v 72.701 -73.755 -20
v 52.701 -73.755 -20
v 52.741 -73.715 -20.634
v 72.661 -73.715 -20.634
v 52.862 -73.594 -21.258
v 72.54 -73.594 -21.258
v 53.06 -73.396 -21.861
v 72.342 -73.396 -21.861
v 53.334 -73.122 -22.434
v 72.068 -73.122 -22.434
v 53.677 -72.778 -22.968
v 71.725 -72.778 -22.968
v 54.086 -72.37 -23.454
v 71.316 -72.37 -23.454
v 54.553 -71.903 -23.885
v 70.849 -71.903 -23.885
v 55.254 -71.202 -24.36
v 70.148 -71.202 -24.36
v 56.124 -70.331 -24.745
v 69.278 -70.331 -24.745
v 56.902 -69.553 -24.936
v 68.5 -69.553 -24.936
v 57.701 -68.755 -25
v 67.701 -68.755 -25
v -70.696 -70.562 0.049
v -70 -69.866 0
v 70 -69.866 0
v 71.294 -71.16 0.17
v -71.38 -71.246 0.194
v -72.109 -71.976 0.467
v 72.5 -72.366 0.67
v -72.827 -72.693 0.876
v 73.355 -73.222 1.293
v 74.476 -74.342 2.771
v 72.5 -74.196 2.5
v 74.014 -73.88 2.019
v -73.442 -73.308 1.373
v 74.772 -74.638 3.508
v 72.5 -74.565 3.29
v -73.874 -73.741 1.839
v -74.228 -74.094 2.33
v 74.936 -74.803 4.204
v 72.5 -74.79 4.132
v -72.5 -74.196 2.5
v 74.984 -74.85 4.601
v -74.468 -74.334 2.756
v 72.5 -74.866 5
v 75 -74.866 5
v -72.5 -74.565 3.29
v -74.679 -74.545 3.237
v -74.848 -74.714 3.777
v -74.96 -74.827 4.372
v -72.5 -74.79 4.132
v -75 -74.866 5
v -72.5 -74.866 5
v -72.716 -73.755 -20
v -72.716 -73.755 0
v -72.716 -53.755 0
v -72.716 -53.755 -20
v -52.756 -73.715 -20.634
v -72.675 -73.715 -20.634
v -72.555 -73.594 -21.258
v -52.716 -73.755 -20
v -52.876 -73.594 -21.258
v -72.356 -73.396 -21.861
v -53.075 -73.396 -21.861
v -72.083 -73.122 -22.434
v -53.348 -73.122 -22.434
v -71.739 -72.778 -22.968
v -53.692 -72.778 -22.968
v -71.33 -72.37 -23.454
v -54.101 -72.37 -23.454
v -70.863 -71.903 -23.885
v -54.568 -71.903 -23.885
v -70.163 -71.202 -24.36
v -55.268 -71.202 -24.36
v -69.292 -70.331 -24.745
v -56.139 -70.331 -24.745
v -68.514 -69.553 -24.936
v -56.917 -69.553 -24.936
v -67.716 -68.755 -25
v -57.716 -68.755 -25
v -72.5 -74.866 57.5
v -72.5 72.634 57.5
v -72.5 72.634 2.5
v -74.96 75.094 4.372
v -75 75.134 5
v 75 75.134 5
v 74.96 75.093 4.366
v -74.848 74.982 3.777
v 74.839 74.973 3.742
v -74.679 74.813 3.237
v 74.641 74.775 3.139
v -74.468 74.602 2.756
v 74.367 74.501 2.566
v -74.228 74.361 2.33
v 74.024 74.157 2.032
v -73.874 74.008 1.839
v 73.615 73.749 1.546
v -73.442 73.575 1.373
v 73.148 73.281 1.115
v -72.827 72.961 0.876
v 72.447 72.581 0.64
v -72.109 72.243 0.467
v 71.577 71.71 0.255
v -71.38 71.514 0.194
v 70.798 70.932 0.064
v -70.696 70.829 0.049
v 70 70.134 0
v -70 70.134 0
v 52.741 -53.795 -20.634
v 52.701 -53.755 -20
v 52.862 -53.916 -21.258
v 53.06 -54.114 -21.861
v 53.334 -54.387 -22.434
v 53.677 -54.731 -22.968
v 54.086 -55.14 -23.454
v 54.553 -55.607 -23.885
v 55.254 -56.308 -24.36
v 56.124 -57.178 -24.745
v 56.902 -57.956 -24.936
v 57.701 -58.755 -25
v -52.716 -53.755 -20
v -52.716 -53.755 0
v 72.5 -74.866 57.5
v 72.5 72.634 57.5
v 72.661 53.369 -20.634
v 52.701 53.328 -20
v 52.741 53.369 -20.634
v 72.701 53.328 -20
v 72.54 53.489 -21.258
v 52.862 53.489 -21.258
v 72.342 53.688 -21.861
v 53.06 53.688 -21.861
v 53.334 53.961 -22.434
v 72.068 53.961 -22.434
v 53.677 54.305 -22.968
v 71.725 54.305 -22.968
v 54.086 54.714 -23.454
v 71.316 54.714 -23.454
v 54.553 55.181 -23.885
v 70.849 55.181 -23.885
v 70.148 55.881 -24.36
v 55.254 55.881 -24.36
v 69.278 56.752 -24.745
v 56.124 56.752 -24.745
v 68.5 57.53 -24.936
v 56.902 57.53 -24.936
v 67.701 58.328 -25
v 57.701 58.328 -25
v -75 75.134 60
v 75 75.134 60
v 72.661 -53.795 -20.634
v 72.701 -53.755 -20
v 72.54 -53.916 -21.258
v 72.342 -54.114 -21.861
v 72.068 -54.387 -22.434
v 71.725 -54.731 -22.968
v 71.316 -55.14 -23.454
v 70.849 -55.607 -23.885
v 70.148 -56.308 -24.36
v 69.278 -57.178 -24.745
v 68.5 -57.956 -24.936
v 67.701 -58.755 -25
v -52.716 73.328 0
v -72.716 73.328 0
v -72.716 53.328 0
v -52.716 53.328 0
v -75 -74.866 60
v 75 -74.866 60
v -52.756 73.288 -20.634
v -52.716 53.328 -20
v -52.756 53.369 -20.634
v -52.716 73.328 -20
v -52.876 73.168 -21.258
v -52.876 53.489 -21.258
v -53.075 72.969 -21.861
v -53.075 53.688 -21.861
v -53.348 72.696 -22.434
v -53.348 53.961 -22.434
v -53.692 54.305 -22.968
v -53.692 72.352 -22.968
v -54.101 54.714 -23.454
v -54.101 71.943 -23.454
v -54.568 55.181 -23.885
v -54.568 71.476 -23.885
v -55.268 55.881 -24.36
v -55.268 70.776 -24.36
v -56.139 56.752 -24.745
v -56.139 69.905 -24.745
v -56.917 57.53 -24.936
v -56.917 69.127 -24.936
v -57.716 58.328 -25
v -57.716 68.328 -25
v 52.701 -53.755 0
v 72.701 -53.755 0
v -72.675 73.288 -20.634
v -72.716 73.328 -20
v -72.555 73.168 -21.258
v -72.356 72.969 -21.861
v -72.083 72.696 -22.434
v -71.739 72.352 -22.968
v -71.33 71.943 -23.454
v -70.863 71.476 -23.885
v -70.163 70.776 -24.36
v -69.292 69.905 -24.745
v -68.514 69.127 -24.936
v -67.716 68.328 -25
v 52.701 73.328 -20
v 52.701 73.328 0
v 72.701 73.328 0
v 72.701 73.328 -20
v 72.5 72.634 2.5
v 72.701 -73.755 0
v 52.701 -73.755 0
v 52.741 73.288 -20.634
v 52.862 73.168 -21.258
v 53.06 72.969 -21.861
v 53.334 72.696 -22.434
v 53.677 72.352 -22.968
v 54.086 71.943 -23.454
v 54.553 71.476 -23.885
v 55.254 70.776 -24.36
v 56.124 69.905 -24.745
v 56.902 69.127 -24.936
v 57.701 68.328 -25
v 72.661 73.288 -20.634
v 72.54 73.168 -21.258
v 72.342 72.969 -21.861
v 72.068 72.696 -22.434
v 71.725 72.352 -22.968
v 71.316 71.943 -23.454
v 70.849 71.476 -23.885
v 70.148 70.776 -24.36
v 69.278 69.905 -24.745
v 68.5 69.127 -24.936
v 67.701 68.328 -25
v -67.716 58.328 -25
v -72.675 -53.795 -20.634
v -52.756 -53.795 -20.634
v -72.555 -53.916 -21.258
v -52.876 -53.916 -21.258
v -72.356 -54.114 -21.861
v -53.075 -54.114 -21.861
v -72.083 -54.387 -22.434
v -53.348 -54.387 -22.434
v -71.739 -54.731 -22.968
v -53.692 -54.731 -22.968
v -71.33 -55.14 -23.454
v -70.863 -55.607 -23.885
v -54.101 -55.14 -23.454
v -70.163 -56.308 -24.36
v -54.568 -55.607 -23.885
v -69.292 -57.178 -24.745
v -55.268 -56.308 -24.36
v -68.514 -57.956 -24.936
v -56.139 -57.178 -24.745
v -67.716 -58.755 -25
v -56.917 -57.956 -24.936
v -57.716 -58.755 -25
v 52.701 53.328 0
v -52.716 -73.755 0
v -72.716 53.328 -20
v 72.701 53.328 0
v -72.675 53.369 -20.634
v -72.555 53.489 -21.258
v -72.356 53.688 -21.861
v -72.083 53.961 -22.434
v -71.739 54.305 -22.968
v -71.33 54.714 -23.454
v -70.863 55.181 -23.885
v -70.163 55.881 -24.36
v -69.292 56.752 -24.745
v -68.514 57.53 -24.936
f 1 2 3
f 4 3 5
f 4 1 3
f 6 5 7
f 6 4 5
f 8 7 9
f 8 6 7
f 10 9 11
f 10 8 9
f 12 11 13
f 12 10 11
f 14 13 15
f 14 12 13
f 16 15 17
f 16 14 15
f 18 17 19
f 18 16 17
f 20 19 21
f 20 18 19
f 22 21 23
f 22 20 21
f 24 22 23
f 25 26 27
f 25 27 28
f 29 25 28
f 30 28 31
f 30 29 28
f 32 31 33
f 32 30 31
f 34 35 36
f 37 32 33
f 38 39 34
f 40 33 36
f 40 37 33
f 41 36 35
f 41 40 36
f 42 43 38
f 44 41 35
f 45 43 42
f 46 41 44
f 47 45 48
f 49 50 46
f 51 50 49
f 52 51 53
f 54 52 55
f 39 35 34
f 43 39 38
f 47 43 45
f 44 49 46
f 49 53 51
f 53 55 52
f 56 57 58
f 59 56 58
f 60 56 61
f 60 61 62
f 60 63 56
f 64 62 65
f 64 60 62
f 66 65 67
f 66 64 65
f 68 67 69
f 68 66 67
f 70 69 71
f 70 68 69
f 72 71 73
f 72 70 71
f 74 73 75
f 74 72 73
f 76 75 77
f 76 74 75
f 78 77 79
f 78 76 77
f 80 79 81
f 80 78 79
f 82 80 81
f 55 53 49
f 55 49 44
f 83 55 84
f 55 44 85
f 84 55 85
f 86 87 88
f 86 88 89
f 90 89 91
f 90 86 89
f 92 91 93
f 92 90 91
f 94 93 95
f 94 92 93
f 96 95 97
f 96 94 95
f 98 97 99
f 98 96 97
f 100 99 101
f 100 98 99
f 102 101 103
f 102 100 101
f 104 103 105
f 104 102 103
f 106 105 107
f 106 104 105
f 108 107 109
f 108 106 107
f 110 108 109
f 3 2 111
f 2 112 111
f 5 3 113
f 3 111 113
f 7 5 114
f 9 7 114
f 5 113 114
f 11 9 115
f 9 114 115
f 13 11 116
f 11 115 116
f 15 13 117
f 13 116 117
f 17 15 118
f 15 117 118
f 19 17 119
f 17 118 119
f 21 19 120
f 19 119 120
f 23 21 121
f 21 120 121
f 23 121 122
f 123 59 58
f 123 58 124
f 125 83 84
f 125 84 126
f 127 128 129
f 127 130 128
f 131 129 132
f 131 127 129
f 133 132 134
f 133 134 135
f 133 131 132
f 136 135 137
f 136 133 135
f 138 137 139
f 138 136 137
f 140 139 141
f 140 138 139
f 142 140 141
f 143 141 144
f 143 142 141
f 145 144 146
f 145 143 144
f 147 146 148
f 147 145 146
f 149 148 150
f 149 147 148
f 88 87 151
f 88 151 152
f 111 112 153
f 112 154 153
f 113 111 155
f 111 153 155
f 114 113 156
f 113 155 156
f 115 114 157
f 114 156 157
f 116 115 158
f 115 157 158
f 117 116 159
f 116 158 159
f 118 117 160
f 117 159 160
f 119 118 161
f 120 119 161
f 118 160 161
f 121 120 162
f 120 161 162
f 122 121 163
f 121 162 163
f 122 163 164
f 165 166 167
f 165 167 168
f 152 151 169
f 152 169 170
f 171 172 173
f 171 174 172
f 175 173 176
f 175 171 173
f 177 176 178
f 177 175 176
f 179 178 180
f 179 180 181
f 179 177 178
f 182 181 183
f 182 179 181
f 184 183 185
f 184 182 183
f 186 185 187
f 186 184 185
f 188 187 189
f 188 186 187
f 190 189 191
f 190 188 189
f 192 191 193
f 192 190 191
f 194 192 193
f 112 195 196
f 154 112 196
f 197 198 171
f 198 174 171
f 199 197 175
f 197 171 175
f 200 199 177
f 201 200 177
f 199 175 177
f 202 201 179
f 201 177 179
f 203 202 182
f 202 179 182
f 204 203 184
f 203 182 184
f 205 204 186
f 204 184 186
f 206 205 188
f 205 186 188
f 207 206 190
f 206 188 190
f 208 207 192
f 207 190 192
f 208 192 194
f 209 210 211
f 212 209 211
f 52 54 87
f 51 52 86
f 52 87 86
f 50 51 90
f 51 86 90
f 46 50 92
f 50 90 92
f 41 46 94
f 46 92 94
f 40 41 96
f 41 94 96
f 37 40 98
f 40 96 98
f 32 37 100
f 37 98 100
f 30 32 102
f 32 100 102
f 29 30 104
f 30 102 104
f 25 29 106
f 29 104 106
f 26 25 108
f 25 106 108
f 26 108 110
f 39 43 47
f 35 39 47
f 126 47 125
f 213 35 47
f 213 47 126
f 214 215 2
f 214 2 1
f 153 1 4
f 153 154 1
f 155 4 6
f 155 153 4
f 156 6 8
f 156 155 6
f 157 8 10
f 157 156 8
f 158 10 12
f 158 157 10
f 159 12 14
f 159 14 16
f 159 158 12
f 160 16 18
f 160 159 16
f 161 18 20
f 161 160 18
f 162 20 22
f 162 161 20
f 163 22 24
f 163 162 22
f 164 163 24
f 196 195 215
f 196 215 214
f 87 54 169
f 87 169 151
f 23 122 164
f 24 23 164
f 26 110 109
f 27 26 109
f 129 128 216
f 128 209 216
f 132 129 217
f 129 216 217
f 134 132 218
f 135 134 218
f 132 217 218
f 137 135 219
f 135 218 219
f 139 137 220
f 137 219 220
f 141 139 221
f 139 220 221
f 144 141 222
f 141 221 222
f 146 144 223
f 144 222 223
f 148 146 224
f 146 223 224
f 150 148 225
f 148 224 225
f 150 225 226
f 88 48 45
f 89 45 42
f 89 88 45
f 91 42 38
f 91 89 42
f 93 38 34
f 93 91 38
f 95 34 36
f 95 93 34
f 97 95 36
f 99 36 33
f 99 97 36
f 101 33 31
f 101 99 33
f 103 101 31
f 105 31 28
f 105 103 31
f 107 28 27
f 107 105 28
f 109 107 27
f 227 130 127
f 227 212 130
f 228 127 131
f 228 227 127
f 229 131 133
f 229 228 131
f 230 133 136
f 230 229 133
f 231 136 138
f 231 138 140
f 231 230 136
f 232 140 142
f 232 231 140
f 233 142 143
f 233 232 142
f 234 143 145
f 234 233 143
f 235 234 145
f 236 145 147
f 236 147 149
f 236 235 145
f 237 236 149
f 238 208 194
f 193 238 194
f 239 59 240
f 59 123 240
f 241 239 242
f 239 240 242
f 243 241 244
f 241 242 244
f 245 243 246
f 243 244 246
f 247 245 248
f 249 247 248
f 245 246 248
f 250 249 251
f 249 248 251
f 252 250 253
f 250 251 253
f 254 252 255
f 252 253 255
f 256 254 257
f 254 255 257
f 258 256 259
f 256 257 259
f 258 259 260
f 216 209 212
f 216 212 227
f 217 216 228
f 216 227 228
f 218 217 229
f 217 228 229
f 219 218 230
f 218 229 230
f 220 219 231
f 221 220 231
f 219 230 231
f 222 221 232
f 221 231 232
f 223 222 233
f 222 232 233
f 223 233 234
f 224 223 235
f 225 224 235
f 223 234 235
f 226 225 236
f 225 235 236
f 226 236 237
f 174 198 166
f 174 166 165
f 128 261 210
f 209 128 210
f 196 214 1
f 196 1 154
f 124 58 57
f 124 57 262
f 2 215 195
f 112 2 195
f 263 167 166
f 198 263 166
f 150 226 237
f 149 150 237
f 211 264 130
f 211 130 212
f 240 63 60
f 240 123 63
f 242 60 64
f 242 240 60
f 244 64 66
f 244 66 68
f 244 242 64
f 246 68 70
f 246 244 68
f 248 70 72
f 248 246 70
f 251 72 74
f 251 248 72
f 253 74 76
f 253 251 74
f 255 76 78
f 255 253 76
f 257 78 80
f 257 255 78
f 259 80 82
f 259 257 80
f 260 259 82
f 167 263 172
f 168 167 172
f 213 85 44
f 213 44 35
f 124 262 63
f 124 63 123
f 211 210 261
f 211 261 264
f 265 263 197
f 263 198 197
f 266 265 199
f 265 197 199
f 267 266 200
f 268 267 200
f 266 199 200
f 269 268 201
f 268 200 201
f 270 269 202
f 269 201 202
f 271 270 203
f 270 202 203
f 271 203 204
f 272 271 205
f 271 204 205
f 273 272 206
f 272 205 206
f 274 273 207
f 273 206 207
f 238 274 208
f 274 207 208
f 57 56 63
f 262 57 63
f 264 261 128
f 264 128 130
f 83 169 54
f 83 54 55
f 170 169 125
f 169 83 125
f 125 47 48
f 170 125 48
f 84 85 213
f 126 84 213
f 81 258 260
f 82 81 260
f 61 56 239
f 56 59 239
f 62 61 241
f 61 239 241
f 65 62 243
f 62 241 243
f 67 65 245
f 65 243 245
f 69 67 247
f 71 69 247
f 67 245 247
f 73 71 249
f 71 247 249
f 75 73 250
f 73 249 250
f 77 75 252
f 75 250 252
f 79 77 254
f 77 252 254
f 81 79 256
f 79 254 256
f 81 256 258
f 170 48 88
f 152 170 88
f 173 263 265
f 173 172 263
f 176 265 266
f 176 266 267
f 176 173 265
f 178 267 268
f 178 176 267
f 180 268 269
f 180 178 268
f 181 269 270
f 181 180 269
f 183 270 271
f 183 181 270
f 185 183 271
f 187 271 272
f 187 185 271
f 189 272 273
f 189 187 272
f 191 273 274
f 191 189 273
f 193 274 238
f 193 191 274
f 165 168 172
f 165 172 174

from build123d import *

# Parameters (mm, degrees)
F0_W        = 20
F0_H        = 20
F1_DEPTH    = 25
F2_W        = 150
F2_H        = 150
F3_DEPTH    = 60
F4_T        = -2.5
F5_R        = 5
F5_2_R      = 5
F5_3_R      = 5
F5_4_R      = 5
F6_T1_DEPTH = 175
F6_T3_DEPTH = 175


# Not quite as in the source:
# - a fillet or chamfer that OpenCascade refuses, or shapes differently, is made with other operations: its cross-section is extruded or revolved along the edge and cut away or added


with BuildPart() as f1:
    # F0 (on Top) → F1 (new body)
    with BuildSketch(Plane.XY):
        with Locations((-62.7156771406, 63.3284281388)):
            Rectangle(F0_W, F0_H)
    extrude(amount=-F1_DEPTH)

    # F5#4
    f5_4_edges = [f1.edges().sort_by_distance(p)[0] for p in [
        (-62.715677, 73.328428, -25),
        (-72.715677, 63.328428, -25),
        (-62.715677, 53.328428, -25),
        (-52.715677, 63.328428, -25),
    ]]
    fillet(f5_4_edges, radius=F5_4_R)


with BuildPart() as f1b:
    # F0 (on Top) → F1, piece 2 (new body)
    with BuildSketch(Plane.XY):
        with Locations((-62.7156771406, -63.7548786509)):
            Rectangle(F0_W, F0_H)
    extrude(amount=-F1_DEPTH)

    # F5
    f5_edges = [f1b.edges().sort_by_distance(p)[0] for p in [
        (-62.715677, -53.754879, -25),
        (-72.715677, -63.754879, -25),
        (-62.715677, -73.754879, -25),
        (-52.715677, -63.754879, -25),
    ]]
    fillet(f5_edges, radius=F5_R)


with BuildPart() as f1c:
    # F0 (on Top) → F1, piece 3 (new body)
    with BuildSketch(Plane.XY):
        with Locations((62.7009654807, 63.3284281388)):
            Rectangle(F0_W, F0_H)
    extrude(amount=-F1_DEPTH)

    # F5#3
    f5_3_edges = [f1c.edges().sort_by_distance(p)[0] for p in [
        (52.700965, 63.328428, -25),
        (62.700965, 53.328428, -25),
        (72.700965, 63.328428, -25),
        (62.700965, 73.328428, -25),
    ]]
    fillet(f5_3_edges, radius=F5_3_R)


with BuildPart() as f1d:
    # F0 (on Top) → F1, piece 4 (new body)
    with BuildSketch(Plane.XY):
        with Locations((62.7009654807, -63.7548786509)):
            Rectangle(F0_W, F0_H)
    extrude(amount=-F1_DEPTH)

    # F5#2
    f5_2_edges = [f1d.edges().sort_by_distance(p)[0] for p in [
        (52.700965, -63.754879, -25),
        (62.700965, -73.754879, -25),
        (72.700965, -63.754879, -25),
        (62.700965, -53.754879, -25),
    ]]
    fillet(f5_2_edges, radius=F5_2_R)


with BuildPart() as f3:
    # F2 (on Top) → F3 (new body)
    with BuildSketch(Plane.XY):
        with Locations((-3.77863e-05, 0.1337043941)):
            Rectangle(F2_W, F2_H)
    extrude(amount=F3_DEPTH)

    # F4
    f4_openings = [f3.faces().sort_by_distance(p)[0] for p in [
        (-3.8e-05, -74.866296, 30),
    ]]
    offset(amount=F4_T, openings=f4_openings)

    # F6: fillet of radius 5 on 4 edges, made by hand

    # F6_s2 → F6_t1 (cut)
    with BuildSketch(Plane.YZ.offset(-87.5000377863)):
        with BuildLine():
            ThreePointArc((75.1337043941, 5), (73.6692383, 1.4644660941), (70.1337043941, 0))
            Line((70.1337043941, 0), (75.1337043941, 0))
            Line((75.1337043941, 0), (75.1337043941, 5))
        make_face()
        with BuildLine():
            ThreePointArc((-69.8662956059, 0), (-73.4018295118, 1.4644660941), (-74.8662956059, 5))
            Line((-74.8662956059, 5), (-74.8662956059, 0))
            Line((-74.8662956059, 0), (-69.8662956059, 0))
        make_face()
    extrude(amount=F6_T1_DEPTH, mode=Mode.SUBTRACT)

    # F6_s4 → F6_t3 (cut)
    with BuildSketch(Plane.XZ.offset(-87.6337043941)):
        with BuildLine():
            ThreePointArc((-75.0000377863, 5), (-73.5355716923, 1.4644660941), (-70.0000377863, 0))
            Line((-70.0000377863, 0), (-75.0000377863, 0))
            Line((-75.0000377863, 0), (-75.0000377863, 5))
        make_face()
        with BuildLine():
            ThreePointArc((74.9999622137, 5), (73.5354961196, 1.4644660941), (69.9999622137, 0))
            Line((69.9999622137, 0), (74.9999622137, 0))
            Line((74.9999622137, 0), (74.9999622137, 5))
        make_face()
    extrude(amount=F6_T3_DEPTH, mode=Mode.SUBTRACT)


solid = Compound([f1.part, f1b.part, f1c.part, f1d.part, f3.part])
